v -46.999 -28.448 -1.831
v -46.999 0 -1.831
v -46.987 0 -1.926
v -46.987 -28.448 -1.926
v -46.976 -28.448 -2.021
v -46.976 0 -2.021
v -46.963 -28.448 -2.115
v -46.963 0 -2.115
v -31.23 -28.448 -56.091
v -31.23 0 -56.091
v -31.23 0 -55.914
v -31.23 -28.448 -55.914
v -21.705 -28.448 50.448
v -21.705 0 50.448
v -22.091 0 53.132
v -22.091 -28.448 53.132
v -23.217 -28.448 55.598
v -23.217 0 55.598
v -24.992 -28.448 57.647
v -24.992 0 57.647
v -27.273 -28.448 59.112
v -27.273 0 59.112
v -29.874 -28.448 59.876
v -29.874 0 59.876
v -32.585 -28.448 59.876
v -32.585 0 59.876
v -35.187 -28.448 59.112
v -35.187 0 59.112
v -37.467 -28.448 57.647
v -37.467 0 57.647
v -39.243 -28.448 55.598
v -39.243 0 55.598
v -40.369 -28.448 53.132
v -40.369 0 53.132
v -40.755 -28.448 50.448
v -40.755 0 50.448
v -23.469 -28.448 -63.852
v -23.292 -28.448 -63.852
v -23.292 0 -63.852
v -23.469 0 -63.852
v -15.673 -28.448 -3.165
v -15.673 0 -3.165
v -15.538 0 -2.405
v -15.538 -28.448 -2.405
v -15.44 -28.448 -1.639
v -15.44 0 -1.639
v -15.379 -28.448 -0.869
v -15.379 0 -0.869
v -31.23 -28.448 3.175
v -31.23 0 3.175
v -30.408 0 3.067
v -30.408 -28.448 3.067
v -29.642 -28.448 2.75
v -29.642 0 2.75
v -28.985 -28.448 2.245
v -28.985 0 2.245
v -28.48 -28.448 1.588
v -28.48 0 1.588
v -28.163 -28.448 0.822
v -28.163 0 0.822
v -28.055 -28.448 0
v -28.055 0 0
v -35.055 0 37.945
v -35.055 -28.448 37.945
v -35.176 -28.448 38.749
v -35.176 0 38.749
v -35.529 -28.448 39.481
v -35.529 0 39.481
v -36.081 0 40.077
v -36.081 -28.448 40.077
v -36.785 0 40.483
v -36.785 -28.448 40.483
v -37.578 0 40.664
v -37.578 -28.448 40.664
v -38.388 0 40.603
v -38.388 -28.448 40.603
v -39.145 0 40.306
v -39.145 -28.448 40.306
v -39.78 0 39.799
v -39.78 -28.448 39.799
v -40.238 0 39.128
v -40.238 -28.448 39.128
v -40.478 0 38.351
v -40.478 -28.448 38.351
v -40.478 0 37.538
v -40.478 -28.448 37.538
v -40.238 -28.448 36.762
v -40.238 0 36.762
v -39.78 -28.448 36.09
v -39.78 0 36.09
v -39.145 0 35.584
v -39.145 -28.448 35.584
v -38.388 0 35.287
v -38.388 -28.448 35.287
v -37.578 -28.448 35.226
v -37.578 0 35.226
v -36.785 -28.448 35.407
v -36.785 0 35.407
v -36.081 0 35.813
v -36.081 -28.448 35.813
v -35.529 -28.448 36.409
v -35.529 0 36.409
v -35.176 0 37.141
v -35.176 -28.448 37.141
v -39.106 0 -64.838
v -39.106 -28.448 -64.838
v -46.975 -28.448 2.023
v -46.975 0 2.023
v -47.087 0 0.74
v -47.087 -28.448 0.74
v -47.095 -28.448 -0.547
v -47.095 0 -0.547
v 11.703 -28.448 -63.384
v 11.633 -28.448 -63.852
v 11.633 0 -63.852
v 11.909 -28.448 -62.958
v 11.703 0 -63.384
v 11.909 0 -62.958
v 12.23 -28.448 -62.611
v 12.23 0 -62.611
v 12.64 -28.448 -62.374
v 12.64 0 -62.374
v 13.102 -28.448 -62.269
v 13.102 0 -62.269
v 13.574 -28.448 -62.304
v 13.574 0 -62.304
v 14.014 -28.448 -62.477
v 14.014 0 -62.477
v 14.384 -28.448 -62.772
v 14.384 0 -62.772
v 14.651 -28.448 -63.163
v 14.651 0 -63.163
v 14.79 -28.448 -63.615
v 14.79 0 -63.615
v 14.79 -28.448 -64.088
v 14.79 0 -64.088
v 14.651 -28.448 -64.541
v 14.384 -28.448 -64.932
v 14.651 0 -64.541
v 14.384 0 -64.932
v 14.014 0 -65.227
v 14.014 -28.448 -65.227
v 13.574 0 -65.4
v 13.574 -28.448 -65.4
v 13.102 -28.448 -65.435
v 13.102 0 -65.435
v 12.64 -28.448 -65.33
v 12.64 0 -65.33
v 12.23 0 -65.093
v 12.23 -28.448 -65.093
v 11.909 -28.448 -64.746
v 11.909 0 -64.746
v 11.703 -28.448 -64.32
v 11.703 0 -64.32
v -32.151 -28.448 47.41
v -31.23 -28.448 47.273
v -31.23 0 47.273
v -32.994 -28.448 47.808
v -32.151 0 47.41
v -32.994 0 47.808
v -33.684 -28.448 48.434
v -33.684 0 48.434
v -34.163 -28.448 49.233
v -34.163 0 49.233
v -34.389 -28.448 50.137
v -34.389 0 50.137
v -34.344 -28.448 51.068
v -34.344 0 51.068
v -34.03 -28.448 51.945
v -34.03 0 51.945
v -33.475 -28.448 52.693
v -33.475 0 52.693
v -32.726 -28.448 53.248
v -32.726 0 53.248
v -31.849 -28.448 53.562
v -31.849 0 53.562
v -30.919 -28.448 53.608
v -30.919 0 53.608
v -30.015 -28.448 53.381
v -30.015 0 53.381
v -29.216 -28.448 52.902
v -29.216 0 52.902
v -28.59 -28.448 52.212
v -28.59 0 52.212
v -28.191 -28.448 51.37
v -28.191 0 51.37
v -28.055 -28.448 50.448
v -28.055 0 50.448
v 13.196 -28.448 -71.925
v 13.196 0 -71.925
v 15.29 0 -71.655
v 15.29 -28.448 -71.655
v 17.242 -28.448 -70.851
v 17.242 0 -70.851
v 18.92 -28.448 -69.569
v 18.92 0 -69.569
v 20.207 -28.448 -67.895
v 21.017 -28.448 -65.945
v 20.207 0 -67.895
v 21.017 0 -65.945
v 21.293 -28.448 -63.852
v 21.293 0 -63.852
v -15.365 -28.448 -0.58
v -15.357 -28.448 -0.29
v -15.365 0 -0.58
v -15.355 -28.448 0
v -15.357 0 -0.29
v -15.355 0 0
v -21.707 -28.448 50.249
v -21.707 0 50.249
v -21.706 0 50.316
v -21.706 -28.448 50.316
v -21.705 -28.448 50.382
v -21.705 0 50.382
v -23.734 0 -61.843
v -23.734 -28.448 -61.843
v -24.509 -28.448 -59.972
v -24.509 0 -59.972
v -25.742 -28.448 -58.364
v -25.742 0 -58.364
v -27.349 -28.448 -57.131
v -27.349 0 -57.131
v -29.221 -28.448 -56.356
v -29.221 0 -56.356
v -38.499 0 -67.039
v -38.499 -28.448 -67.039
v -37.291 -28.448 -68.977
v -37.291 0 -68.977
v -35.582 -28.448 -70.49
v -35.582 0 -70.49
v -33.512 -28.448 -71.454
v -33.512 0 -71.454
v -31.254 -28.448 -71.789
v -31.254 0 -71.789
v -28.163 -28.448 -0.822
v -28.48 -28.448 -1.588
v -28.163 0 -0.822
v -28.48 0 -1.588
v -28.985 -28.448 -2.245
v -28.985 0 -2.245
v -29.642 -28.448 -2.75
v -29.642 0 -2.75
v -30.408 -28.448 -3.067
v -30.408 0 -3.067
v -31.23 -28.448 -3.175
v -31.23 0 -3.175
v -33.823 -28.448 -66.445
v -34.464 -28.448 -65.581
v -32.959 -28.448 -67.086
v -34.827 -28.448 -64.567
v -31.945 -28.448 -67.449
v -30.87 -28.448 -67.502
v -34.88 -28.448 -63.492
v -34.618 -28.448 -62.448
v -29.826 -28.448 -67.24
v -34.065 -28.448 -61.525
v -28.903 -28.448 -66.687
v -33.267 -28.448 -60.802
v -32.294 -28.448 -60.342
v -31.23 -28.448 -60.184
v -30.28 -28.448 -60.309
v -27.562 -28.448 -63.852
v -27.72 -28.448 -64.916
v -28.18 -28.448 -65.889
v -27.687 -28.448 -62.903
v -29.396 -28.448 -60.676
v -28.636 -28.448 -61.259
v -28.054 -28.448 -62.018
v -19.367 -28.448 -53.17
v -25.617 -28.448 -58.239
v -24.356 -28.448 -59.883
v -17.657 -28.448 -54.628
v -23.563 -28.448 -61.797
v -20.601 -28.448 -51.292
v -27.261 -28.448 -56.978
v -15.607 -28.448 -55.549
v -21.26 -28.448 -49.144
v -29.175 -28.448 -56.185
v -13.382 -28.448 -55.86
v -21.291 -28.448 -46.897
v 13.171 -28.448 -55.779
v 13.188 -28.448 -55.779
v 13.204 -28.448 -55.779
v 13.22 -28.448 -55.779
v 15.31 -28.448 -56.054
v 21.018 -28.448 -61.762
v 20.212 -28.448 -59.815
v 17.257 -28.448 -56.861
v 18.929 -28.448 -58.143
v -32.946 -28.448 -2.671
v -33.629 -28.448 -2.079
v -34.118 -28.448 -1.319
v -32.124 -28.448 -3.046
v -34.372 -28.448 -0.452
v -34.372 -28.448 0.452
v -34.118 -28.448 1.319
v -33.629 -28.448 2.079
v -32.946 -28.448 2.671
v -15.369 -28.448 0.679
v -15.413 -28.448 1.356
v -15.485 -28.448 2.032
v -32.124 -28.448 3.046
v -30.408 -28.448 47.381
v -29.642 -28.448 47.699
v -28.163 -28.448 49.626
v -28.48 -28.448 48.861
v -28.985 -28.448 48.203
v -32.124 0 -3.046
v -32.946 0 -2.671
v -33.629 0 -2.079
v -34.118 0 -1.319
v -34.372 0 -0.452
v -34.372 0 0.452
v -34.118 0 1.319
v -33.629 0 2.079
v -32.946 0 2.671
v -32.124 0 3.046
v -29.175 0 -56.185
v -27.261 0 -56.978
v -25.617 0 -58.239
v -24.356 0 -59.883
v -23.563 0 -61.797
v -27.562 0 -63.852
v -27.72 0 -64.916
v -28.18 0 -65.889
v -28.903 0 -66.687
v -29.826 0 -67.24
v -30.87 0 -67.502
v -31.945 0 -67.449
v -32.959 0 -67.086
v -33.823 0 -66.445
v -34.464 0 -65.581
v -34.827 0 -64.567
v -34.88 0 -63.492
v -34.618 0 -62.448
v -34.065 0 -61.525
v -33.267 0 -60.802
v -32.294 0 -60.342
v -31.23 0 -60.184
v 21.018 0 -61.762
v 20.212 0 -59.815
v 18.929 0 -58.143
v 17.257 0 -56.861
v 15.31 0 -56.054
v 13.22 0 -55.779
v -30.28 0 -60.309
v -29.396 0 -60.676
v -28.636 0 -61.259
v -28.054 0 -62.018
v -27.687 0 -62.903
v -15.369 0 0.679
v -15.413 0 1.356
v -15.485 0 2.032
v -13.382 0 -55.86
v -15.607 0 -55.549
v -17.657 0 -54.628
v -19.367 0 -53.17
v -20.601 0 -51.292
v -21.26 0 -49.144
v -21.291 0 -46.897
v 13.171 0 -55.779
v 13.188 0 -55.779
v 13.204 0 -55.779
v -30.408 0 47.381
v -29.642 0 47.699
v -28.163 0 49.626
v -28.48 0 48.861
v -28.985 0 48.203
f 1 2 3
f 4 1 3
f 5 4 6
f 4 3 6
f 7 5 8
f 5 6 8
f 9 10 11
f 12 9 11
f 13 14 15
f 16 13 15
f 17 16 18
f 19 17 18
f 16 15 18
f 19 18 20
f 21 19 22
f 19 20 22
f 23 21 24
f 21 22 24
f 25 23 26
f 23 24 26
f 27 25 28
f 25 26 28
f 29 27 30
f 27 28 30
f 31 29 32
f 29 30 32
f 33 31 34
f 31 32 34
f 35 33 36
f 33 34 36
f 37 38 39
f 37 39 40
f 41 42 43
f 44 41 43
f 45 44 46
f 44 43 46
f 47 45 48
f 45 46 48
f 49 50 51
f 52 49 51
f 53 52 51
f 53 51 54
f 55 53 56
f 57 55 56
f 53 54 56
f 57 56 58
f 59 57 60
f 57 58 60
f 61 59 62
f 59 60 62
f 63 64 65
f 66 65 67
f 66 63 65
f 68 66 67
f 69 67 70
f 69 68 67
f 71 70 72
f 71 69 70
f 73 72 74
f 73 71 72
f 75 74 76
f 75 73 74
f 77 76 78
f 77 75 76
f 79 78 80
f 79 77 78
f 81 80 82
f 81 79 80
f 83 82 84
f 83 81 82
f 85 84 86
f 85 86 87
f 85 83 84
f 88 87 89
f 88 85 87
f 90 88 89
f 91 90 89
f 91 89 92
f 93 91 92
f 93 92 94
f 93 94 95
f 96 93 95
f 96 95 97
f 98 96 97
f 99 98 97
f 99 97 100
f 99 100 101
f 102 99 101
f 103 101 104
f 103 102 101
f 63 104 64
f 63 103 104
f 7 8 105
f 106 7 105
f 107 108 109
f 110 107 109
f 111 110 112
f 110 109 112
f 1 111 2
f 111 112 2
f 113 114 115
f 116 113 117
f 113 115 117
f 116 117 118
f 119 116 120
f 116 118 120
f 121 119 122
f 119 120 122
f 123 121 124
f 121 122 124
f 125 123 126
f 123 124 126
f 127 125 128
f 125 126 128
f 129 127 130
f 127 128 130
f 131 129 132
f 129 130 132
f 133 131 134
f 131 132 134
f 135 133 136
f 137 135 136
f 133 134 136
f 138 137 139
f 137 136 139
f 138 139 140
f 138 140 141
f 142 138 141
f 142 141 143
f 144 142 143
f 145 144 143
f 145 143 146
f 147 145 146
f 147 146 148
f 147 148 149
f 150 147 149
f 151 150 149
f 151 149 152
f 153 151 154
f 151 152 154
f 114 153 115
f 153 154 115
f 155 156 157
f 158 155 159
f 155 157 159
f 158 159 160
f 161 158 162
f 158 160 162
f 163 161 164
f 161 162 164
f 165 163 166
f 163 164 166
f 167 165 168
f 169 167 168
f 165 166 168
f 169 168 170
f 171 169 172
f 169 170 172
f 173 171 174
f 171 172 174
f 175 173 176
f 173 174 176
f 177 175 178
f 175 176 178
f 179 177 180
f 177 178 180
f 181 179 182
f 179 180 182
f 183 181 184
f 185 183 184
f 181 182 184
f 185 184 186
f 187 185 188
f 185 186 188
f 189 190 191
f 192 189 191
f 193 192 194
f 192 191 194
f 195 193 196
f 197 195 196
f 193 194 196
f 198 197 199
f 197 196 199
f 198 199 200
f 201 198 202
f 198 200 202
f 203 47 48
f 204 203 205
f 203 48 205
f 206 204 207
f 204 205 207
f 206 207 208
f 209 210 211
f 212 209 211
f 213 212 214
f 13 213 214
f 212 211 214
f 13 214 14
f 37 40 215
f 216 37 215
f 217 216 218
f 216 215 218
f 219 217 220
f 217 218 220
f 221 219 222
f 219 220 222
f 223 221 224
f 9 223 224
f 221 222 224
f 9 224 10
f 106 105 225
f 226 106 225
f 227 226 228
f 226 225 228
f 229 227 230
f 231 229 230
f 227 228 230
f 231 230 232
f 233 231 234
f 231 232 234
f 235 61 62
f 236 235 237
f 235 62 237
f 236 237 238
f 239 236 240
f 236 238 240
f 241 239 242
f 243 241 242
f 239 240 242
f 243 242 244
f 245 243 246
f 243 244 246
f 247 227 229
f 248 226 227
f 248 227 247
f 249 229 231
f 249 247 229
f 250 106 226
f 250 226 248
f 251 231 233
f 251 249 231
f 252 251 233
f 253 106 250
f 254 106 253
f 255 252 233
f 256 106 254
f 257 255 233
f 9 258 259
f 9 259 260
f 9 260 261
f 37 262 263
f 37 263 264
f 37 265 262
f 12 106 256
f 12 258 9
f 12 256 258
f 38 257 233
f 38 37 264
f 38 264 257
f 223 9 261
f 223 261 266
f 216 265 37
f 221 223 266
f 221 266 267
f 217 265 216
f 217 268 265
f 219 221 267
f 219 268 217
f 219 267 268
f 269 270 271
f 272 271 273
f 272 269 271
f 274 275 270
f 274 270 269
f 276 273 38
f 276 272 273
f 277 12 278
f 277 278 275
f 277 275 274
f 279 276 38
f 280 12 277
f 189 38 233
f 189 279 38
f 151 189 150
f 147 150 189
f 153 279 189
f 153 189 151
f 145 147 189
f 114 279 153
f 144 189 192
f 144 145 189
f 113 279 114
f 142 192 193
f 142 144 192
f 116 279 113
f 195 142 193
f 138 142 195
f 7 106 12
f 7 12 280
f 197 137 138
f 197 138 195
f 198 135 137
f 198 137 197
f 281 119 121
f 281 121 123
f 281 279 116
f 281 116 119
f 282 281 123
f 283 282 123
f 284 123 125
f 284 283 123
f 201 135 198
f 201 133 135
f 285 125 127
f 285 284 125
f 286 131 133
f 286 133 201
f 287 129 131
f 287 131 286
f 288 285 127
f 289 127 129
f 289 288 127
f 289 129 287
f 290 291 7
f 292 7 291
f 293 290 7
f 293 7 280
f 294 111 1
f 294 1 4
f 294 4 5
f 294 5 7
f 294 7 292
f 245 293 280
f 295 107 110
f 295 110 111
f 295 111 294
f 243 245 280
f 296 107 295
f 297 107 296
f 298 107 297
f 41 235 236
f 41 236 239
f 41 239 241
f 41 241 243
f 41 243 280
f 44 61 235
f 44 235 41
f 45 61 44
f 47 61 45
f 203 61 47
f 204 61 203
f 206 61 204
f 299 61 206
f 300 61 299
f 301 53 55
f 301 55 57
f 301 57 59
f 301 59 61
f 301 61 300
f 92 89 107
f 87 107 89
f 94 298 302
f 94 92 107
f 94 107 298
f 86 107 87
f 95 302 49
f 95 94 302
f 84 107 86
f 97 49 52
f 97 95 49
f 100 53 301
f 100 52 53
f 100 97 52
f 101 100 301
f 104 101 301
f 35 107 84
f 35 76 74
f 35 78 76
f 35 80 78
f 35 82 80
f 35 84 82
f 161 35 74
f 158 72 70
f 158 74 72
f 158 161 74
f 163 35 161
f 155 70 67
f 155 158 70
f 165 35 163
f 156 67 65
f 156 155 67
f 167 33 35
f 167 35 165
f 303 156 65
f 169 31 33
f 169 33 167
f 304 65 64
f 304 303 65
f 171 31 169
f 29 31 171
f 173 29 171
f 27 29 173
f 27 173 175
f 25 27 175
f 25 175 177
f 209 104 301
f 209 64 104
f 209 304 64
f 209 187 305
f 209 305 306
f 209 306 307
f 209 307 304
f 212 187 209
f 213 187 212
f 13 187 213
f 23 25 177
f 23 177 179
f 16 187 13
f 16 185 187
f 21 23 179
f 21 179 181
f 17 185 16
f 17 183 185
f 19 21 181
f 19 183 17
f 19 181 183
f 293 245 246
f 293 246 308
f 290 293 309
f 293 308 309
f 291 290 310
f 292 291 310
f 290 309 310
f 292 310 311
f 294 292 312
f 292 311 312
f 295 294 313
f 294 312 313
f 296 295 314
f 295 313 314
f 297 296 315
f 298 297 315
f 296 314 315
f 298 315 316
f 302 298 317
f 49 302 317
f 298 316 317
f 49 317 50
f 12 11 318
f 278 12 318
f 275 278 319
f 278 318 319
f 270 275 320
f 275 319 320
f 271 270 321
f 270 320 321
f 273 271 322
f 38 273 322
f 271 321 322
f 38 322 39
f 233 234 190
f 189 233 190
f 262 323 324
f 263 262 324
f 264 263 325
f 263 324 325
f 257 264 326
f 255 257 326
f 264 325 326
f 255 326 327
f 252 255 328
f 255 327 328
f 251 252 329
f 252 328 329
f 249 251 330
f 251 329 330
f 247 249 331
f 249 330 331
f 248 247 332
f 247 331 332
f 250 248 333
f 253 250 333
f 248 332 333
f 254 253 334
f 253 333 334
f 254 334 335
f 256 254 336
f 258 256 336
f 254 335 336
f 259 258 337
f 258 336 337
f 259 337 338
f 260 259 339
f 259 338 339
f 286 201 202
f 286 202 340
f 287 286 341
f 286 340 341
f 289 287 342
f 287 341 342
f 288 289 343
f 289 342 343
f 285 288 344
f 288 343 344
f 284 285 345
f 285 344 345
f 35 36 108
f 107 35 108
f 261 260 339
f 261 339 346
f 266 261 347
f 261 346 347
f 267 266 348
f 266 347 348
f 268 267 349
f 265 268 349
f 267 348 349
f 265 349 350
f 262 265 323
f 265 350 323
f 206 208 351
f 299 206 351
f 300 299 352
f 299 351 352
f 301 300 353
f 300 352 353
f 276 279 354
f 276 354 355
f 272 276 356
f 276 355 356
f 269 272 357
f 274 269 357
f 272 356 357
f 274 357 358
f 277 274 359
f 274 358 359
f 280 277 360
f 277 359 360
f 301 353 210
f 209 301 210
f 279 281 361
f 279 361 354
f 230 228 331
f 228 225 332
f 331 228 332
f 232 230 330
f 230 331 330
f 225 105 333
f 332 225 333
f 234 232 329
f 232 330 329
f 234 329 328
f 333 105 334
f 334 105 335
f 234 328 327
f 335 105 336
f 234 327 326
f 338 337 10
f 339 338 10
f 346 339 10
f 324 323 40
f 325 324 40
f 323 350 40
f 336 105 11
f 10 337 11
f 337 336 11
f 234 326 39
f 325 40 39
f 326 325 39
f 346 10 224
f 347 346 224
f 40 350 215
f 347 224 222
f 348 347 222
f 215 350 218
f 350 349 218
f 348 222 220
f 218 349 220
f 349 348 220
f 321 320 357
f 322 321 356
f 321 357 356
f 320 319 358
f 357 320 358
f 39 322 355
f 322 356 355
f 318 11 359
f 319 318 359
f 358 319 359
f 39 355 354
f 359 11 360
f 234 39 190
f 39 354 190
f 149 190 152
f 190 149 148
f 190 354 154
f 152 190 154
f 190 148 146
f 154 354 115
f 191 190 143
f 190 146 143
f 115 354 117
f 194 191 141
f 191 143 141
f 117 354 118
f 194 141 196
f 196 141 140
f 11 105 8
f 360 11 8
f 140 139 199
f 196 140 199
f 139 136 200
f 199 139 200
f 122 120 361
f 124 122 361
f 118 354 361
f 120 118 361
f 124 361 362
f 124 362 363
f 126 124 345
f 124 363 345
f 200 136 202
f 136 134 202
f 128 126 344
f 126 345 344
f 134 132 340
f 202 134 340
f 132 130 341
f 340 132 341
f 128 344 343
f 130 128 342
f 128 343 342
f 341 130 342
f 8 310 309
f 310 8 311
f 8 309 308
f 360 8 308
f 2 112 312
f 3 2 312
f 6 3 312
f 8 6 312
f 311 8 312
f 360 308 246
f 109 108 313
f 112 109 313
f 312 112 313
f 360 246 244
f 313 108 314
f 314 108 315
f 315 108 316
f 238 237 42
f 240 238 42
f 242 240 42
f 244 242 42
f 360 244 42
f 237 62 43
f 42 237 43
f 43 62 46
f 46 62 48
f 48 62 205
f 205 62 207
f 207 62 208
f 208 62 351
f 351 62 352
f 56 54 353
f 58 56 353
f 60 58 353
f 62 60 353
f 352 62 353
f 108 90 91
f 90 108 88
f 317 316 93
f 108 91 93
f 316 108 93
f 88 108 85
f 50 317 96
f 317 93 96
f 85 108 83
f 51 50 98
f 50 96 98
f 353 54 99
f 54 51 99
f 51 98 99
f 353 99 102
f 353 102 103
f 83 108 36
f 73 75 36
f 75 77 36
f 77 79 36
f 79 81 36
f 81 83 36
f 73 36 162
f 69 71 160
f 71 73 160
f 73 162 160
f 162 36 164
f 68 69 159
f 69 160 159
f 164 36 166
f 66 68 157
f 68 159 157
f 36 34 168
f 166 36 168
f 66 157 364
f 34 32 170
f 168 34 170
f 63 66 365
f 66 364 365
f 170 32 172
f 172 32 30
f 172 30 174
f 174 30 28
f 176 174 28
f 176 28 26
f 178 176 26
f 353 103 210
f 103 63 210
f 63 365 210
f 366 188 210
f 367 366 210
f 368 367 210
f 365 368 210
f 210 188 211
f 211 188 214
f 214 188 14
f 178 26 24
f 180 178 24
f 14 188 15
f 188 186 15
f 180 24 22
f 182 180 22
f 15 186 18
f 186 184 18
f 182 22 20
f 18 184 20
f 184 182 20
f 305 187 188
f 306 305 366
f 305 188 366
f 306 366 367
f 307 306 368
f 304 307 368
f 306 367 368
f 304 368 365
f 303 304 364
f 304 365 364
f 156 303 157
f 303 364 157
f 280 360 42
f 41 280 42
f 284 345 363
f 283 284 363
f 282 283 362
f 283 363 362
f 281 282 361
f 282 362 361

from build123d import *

# Parameters (mm, degrees)
F0_R     = 2.726595534
F1_DEPTH = 28.448


with BuildPart() as f1:
    # F0 (on Front) → F1 (new body)
    with BuildSketch(Plane.XZ):
        with BuildLine():
            ThreePointArc((-40.7547102064, 50.4481623903), (-37.9649022972, 43.7129702995), (-31.2297102064, 40.9231623903))
            ThreePointArc((-31.2297102064, 40.9231623903), (-24.5651627011, 43.6430590443), (-21.7067843213, 50.2493972355))
            ThreePointArc((-21.7067843213, 50.2493972355), (-21.7052287492, 50.3487744022), (-21.7047102064, 50.4481623903))
            ThreePointArc((-21.7047102064, 50.4481623903), (-31.2297102064, 59.9731623903), (-40.7547102064, 50.4481623903))
        make_face()
        with BuildLine():
            ThreePointArc((-28.0547102064, 50.4481623903), (-28.9846461761, 48.20309836), (-31.2297102064, 47.2731623903))
            ThreePointArc((-31.2297102064, 47.2731623903), (-33.4747742367, 52.6932264205), (-28.0547102064, 50.4481623903))
        make_face(mode=Mode.SUBTRACT)
        with BuildLine():
            ThreePointArc((-21.7067843213, 50.2493972355), (-24.5651627011, 43.6430590443), (-31.2297102064, 40.9231623903))
            Line((-31.2297102064, 40.9231623903), (-31.2297102064, 15.875))
            ThreePointArc((-31.2297102064, 15.875), (-20.7472149459, 11.9219511035), (-15.485231978, 2.0315093686))
            Line((-15.485231978, 2.0315093686), (-21.7067843213, 50.2493972355))
        make_face()
        with BuildLine():
            Line((-31.2297102064, 15.875), (-31.2297102064, 40.9231623903))
            ThreePointArc((-31.2297102064, 40.9231623903), (-37.9649022972, 43.7129702995), (-40.7547102064, 50.4481623903))
            Line((-40.7547102064, 50.4481623903), (-46.9753299172, 2.0226430538))
            ThreePointArc((-46.9753299172, 2.0226430538), (-41.7155617818, 11.918999192), (-31.2297102064, 15.875))
        make_face()
        with Locations((-37.7813987434, 37.9448458552)):
            Circle(F0_R, mode=Mode.SUBTRACT)
        with BuildLine():
            ThreePointArc((-15.485231978, 2.0315093686), (-20.7472149459, 11.9219511035), (-31.2297102064, 15.875))
            Line((-31.2297102064, 15.875), (-31.2297102064, 3.175))
            ThreePointArc((-31.2297102064, 3.175), (-28.9846461761, 2.2450640303), (-28.0547102064, 0))
            ThreePointArc((-28.0547102064, 0), (-28.9846461761, -2.2450640303), (-31.2297102064, -3.175))
            Line((-31.2297102064, -3.175), (-31.2297102064, -15.875))
            ThreePointArc((-31.2297102064, -15.875), (-21.1855906399, -12.2935465645), (-15.6734454391, -3.1651621585))
            Line((-15.6734454391, -3.1651621585), (-15.3785323056, -0.8693584745))
            ThreePointArc((-15.3785323056, -0.8693584745), (-15.3606668487, -0.4348423995), (-15.3547102064, 0))
            ThreePointArc((-15.3547102064, 0), (-15.3873742537, 1.0178489878), (-15.485231978, 2.0315093686))
        make_face()
        with BuildLine():
            Line((-31.2297102064, 3.175), (-31.2297102064, 15.875))
            ThreePointArc((-31.2297102064, 15.875), (-41.7155617818, 11.918999192), (-46.9753299172, 2.0226430538))
            ThreePointArc((-46.9753299172, 2.0226430538), (-47.1044165332, 0.0965610555), (-46.998770155, -1.8309487529))
            Line((-46.998770155, -1.8309487529), (-46.9631299673, -2.1154497456))
            ThreePointArc((-46.9631299673, -2.1154497456), (-41.6803766992, -11.9498617086), (-31.2297102064, -15.875))
            Line((-31.2297102064, -15.875), (-31.2297102064, -3.175))
            ThreePointArc((-31.2297102064, -3.175), (-34.4047102064, 0), (-31.2297102064, 3.175))
        make_face()
        with BuildLine():
            ThreePointArc((21.293102882, -63.8518376097), (18.9286306717, -58.1434967317), (13.2202897936, -55.7790245213))
            ThreePointArc((13.2202897936, -55.7790245213), (7.5119489155, -58.1434967317), (5.1474767052, -63.8518376097))
            ThreePointArc((5.1474767052, -63.8518376097), (7.5032669549, -69.5514833024), (13.1957148264, -71.9246132929))
            ThreePointArc((13.1957148264, -71.9246132929), (18.9199354863, -69.5688604485), (21.293102882, -63.8518376097))
        make_face()
        with BuildLine():
            ThreePointArc((14.8077897936, -63.8518376097), (13.2202897936, -65.4393376097), (11.6327897936, -63.8518376097))
            ThreePointArc((11.6327897936, -63.8518376097), (13.2202897936, -62.2643376097), (14.8077897936, -63.8518376097))
        make_face(mode=Mode.SUBTRACT)
        with BuildLine():
            Line((-46.9631299673, -2.1154497456), (-46.998770155, -1.8309487529))
            ThreePointArc((-46.998770155, -1.8309487529), (-46.9815923849, -1.9732797148), (-46.9631299673, -2.1154497456))
        make_face()
        with BuildLine():
            ThreePointArc((-15.6734454391, -3.1651621585), (-21.1855906399, -12.2935465645), (-31.2297102064, -15.875))
            Line((-31.2297102064, -15.875), (-31.2297102064, -55.9143376097))
            ThreePointArc((-31.2297102064, -55.9143376097), (-25.6170501307, -58.2391775341), (-23.2922102064, -63.8518376097))
            Line((-23.2922102064, -63.8518376097), (5.1474767052, -63.8518376097))
            ThreePointArc((5.1474767052, -63.8518376097), (7.5119489155, -58.1434967317), (13.2202897936, -55.7790245213))
            Line((13.2202897936, -55.7790245213), (-13.3815098989, -55.859982763))
            ThreePointArc((-13.3815098989, -55.859982763), (-19.3667419826, -53.1702109374), (-21.2911113125, -46.896880223))
            Line((-21.2911113125, -46.896880223), (-15.6734454391, -3.1651621585))
        make_face()
        with BuildLine():
            Line((-31.2297102064, -55.9143376097), (-31.2297102064, -15.875))
            ThreePointArc((-31.2297102064, -15.875), (-41.6803766992, -11.9498617086), (-46.9631299673, -2.1154497456))
            Line((-46.9631299673, -2.1154497456), (-39.1056512957, -64.8384774671))
            ThreePointArc((-39.1056512957, -64.8384774671), (-37.1809857049, -58.5995784586), (-31.2297102064, -55.9143376097))
        make_face()
        with BuildLine():
            ThreePointArc((-15.6734454391, -3.1651621585), (-15.4840904226, -2.0226424854), (-15.3785323056, -0.8693584745))
            Line((-15.3785323056, -0.8693584745), (-15.6734454391, -3.1651621585))
        make_face()
        with BuildLine():
            Line((-31.2297102064, -56.0912296504), (-31.2297102064, -55.9143376097))
            ThreePointArc((-31.2297102064, -55.9143376097), (-37.1809857049, -58.5995784586), (-39.1056512957, -64.8384774671))
            ThreePointArc((-39.1056512957, -64.8384774671), (-36.4910987194, -69.7950435766), (-31.2540792155, -71.7893002019))
            ThreePointArc((-31.2540792155, -71.7893002019), (-25.6256724995, -69.4731068285), (-23.2922102064, -63.8518376097))
            Line((-23.2922102064, -63.8518376097), (-23.469102247, -63.8518376097))
            ThreePointArc((-23.469102247, -63.8518376097), (-36.7172887206, -69.3394161239), (-31.2297102064, -56.0912296504))
        make_face()
        with BuildLine():
            Line((5.1474767052, -63.8518376097), (-23.2922102064, -63.8518376097))
            ThreePointArc((-23.2922102064, -63.8518376097), (-25.6256724995, -69.4731068285), (-31.2540792155, -71.7893002019))
            Line((-31.2540792155, -71.7893002019), (13.1957148264, -71.9246132929))
            ThreePointArc((13.1957148264, -71.9246132929), (7.5032669549, -69.5514833024), (5.1474767052, -63.8518376097))
        make_face()
        with BuildLine():
            Line((-31.2297102064, -60.1843108323), (-31.2297102064, -56.0912296504))
            ThreePointArc((-31.2297102064, -56.0912296504), (-36.7172887206, -69.3394161239), (-23.469102247, -63.8518376097))
            Line((-23.469102247, -63.8518376097), (-27.562183429, -63.8518376097))
            ThreePointArc((-27.562183429, -63.8518376097), (-33.8230432609, -66.4451706642), (-31.2297102064, -60.1843108323))
        make_face()
        with BuildLine():
            ThreePointArc((-23.469102247, -63.8518376097), (-25.7421316922, -58.3642590955), (-31.2297102064, -56.0912296504))
            Line((-31.2297102064, -56.0912296504), (-31.2297102064, -60.1843108323))
            ThreePointArc((-31.2297102064, -60.1843108323), (-28.6363771519, -61.2585045552), (-27.562183429, -63.8518376097))
            Line((-27.562183429, -63.8518376097), (-23.469102247, -63.8518376097))
        make_face()
    extrude(amount=F1_DEPTH)


solid = f1.part
